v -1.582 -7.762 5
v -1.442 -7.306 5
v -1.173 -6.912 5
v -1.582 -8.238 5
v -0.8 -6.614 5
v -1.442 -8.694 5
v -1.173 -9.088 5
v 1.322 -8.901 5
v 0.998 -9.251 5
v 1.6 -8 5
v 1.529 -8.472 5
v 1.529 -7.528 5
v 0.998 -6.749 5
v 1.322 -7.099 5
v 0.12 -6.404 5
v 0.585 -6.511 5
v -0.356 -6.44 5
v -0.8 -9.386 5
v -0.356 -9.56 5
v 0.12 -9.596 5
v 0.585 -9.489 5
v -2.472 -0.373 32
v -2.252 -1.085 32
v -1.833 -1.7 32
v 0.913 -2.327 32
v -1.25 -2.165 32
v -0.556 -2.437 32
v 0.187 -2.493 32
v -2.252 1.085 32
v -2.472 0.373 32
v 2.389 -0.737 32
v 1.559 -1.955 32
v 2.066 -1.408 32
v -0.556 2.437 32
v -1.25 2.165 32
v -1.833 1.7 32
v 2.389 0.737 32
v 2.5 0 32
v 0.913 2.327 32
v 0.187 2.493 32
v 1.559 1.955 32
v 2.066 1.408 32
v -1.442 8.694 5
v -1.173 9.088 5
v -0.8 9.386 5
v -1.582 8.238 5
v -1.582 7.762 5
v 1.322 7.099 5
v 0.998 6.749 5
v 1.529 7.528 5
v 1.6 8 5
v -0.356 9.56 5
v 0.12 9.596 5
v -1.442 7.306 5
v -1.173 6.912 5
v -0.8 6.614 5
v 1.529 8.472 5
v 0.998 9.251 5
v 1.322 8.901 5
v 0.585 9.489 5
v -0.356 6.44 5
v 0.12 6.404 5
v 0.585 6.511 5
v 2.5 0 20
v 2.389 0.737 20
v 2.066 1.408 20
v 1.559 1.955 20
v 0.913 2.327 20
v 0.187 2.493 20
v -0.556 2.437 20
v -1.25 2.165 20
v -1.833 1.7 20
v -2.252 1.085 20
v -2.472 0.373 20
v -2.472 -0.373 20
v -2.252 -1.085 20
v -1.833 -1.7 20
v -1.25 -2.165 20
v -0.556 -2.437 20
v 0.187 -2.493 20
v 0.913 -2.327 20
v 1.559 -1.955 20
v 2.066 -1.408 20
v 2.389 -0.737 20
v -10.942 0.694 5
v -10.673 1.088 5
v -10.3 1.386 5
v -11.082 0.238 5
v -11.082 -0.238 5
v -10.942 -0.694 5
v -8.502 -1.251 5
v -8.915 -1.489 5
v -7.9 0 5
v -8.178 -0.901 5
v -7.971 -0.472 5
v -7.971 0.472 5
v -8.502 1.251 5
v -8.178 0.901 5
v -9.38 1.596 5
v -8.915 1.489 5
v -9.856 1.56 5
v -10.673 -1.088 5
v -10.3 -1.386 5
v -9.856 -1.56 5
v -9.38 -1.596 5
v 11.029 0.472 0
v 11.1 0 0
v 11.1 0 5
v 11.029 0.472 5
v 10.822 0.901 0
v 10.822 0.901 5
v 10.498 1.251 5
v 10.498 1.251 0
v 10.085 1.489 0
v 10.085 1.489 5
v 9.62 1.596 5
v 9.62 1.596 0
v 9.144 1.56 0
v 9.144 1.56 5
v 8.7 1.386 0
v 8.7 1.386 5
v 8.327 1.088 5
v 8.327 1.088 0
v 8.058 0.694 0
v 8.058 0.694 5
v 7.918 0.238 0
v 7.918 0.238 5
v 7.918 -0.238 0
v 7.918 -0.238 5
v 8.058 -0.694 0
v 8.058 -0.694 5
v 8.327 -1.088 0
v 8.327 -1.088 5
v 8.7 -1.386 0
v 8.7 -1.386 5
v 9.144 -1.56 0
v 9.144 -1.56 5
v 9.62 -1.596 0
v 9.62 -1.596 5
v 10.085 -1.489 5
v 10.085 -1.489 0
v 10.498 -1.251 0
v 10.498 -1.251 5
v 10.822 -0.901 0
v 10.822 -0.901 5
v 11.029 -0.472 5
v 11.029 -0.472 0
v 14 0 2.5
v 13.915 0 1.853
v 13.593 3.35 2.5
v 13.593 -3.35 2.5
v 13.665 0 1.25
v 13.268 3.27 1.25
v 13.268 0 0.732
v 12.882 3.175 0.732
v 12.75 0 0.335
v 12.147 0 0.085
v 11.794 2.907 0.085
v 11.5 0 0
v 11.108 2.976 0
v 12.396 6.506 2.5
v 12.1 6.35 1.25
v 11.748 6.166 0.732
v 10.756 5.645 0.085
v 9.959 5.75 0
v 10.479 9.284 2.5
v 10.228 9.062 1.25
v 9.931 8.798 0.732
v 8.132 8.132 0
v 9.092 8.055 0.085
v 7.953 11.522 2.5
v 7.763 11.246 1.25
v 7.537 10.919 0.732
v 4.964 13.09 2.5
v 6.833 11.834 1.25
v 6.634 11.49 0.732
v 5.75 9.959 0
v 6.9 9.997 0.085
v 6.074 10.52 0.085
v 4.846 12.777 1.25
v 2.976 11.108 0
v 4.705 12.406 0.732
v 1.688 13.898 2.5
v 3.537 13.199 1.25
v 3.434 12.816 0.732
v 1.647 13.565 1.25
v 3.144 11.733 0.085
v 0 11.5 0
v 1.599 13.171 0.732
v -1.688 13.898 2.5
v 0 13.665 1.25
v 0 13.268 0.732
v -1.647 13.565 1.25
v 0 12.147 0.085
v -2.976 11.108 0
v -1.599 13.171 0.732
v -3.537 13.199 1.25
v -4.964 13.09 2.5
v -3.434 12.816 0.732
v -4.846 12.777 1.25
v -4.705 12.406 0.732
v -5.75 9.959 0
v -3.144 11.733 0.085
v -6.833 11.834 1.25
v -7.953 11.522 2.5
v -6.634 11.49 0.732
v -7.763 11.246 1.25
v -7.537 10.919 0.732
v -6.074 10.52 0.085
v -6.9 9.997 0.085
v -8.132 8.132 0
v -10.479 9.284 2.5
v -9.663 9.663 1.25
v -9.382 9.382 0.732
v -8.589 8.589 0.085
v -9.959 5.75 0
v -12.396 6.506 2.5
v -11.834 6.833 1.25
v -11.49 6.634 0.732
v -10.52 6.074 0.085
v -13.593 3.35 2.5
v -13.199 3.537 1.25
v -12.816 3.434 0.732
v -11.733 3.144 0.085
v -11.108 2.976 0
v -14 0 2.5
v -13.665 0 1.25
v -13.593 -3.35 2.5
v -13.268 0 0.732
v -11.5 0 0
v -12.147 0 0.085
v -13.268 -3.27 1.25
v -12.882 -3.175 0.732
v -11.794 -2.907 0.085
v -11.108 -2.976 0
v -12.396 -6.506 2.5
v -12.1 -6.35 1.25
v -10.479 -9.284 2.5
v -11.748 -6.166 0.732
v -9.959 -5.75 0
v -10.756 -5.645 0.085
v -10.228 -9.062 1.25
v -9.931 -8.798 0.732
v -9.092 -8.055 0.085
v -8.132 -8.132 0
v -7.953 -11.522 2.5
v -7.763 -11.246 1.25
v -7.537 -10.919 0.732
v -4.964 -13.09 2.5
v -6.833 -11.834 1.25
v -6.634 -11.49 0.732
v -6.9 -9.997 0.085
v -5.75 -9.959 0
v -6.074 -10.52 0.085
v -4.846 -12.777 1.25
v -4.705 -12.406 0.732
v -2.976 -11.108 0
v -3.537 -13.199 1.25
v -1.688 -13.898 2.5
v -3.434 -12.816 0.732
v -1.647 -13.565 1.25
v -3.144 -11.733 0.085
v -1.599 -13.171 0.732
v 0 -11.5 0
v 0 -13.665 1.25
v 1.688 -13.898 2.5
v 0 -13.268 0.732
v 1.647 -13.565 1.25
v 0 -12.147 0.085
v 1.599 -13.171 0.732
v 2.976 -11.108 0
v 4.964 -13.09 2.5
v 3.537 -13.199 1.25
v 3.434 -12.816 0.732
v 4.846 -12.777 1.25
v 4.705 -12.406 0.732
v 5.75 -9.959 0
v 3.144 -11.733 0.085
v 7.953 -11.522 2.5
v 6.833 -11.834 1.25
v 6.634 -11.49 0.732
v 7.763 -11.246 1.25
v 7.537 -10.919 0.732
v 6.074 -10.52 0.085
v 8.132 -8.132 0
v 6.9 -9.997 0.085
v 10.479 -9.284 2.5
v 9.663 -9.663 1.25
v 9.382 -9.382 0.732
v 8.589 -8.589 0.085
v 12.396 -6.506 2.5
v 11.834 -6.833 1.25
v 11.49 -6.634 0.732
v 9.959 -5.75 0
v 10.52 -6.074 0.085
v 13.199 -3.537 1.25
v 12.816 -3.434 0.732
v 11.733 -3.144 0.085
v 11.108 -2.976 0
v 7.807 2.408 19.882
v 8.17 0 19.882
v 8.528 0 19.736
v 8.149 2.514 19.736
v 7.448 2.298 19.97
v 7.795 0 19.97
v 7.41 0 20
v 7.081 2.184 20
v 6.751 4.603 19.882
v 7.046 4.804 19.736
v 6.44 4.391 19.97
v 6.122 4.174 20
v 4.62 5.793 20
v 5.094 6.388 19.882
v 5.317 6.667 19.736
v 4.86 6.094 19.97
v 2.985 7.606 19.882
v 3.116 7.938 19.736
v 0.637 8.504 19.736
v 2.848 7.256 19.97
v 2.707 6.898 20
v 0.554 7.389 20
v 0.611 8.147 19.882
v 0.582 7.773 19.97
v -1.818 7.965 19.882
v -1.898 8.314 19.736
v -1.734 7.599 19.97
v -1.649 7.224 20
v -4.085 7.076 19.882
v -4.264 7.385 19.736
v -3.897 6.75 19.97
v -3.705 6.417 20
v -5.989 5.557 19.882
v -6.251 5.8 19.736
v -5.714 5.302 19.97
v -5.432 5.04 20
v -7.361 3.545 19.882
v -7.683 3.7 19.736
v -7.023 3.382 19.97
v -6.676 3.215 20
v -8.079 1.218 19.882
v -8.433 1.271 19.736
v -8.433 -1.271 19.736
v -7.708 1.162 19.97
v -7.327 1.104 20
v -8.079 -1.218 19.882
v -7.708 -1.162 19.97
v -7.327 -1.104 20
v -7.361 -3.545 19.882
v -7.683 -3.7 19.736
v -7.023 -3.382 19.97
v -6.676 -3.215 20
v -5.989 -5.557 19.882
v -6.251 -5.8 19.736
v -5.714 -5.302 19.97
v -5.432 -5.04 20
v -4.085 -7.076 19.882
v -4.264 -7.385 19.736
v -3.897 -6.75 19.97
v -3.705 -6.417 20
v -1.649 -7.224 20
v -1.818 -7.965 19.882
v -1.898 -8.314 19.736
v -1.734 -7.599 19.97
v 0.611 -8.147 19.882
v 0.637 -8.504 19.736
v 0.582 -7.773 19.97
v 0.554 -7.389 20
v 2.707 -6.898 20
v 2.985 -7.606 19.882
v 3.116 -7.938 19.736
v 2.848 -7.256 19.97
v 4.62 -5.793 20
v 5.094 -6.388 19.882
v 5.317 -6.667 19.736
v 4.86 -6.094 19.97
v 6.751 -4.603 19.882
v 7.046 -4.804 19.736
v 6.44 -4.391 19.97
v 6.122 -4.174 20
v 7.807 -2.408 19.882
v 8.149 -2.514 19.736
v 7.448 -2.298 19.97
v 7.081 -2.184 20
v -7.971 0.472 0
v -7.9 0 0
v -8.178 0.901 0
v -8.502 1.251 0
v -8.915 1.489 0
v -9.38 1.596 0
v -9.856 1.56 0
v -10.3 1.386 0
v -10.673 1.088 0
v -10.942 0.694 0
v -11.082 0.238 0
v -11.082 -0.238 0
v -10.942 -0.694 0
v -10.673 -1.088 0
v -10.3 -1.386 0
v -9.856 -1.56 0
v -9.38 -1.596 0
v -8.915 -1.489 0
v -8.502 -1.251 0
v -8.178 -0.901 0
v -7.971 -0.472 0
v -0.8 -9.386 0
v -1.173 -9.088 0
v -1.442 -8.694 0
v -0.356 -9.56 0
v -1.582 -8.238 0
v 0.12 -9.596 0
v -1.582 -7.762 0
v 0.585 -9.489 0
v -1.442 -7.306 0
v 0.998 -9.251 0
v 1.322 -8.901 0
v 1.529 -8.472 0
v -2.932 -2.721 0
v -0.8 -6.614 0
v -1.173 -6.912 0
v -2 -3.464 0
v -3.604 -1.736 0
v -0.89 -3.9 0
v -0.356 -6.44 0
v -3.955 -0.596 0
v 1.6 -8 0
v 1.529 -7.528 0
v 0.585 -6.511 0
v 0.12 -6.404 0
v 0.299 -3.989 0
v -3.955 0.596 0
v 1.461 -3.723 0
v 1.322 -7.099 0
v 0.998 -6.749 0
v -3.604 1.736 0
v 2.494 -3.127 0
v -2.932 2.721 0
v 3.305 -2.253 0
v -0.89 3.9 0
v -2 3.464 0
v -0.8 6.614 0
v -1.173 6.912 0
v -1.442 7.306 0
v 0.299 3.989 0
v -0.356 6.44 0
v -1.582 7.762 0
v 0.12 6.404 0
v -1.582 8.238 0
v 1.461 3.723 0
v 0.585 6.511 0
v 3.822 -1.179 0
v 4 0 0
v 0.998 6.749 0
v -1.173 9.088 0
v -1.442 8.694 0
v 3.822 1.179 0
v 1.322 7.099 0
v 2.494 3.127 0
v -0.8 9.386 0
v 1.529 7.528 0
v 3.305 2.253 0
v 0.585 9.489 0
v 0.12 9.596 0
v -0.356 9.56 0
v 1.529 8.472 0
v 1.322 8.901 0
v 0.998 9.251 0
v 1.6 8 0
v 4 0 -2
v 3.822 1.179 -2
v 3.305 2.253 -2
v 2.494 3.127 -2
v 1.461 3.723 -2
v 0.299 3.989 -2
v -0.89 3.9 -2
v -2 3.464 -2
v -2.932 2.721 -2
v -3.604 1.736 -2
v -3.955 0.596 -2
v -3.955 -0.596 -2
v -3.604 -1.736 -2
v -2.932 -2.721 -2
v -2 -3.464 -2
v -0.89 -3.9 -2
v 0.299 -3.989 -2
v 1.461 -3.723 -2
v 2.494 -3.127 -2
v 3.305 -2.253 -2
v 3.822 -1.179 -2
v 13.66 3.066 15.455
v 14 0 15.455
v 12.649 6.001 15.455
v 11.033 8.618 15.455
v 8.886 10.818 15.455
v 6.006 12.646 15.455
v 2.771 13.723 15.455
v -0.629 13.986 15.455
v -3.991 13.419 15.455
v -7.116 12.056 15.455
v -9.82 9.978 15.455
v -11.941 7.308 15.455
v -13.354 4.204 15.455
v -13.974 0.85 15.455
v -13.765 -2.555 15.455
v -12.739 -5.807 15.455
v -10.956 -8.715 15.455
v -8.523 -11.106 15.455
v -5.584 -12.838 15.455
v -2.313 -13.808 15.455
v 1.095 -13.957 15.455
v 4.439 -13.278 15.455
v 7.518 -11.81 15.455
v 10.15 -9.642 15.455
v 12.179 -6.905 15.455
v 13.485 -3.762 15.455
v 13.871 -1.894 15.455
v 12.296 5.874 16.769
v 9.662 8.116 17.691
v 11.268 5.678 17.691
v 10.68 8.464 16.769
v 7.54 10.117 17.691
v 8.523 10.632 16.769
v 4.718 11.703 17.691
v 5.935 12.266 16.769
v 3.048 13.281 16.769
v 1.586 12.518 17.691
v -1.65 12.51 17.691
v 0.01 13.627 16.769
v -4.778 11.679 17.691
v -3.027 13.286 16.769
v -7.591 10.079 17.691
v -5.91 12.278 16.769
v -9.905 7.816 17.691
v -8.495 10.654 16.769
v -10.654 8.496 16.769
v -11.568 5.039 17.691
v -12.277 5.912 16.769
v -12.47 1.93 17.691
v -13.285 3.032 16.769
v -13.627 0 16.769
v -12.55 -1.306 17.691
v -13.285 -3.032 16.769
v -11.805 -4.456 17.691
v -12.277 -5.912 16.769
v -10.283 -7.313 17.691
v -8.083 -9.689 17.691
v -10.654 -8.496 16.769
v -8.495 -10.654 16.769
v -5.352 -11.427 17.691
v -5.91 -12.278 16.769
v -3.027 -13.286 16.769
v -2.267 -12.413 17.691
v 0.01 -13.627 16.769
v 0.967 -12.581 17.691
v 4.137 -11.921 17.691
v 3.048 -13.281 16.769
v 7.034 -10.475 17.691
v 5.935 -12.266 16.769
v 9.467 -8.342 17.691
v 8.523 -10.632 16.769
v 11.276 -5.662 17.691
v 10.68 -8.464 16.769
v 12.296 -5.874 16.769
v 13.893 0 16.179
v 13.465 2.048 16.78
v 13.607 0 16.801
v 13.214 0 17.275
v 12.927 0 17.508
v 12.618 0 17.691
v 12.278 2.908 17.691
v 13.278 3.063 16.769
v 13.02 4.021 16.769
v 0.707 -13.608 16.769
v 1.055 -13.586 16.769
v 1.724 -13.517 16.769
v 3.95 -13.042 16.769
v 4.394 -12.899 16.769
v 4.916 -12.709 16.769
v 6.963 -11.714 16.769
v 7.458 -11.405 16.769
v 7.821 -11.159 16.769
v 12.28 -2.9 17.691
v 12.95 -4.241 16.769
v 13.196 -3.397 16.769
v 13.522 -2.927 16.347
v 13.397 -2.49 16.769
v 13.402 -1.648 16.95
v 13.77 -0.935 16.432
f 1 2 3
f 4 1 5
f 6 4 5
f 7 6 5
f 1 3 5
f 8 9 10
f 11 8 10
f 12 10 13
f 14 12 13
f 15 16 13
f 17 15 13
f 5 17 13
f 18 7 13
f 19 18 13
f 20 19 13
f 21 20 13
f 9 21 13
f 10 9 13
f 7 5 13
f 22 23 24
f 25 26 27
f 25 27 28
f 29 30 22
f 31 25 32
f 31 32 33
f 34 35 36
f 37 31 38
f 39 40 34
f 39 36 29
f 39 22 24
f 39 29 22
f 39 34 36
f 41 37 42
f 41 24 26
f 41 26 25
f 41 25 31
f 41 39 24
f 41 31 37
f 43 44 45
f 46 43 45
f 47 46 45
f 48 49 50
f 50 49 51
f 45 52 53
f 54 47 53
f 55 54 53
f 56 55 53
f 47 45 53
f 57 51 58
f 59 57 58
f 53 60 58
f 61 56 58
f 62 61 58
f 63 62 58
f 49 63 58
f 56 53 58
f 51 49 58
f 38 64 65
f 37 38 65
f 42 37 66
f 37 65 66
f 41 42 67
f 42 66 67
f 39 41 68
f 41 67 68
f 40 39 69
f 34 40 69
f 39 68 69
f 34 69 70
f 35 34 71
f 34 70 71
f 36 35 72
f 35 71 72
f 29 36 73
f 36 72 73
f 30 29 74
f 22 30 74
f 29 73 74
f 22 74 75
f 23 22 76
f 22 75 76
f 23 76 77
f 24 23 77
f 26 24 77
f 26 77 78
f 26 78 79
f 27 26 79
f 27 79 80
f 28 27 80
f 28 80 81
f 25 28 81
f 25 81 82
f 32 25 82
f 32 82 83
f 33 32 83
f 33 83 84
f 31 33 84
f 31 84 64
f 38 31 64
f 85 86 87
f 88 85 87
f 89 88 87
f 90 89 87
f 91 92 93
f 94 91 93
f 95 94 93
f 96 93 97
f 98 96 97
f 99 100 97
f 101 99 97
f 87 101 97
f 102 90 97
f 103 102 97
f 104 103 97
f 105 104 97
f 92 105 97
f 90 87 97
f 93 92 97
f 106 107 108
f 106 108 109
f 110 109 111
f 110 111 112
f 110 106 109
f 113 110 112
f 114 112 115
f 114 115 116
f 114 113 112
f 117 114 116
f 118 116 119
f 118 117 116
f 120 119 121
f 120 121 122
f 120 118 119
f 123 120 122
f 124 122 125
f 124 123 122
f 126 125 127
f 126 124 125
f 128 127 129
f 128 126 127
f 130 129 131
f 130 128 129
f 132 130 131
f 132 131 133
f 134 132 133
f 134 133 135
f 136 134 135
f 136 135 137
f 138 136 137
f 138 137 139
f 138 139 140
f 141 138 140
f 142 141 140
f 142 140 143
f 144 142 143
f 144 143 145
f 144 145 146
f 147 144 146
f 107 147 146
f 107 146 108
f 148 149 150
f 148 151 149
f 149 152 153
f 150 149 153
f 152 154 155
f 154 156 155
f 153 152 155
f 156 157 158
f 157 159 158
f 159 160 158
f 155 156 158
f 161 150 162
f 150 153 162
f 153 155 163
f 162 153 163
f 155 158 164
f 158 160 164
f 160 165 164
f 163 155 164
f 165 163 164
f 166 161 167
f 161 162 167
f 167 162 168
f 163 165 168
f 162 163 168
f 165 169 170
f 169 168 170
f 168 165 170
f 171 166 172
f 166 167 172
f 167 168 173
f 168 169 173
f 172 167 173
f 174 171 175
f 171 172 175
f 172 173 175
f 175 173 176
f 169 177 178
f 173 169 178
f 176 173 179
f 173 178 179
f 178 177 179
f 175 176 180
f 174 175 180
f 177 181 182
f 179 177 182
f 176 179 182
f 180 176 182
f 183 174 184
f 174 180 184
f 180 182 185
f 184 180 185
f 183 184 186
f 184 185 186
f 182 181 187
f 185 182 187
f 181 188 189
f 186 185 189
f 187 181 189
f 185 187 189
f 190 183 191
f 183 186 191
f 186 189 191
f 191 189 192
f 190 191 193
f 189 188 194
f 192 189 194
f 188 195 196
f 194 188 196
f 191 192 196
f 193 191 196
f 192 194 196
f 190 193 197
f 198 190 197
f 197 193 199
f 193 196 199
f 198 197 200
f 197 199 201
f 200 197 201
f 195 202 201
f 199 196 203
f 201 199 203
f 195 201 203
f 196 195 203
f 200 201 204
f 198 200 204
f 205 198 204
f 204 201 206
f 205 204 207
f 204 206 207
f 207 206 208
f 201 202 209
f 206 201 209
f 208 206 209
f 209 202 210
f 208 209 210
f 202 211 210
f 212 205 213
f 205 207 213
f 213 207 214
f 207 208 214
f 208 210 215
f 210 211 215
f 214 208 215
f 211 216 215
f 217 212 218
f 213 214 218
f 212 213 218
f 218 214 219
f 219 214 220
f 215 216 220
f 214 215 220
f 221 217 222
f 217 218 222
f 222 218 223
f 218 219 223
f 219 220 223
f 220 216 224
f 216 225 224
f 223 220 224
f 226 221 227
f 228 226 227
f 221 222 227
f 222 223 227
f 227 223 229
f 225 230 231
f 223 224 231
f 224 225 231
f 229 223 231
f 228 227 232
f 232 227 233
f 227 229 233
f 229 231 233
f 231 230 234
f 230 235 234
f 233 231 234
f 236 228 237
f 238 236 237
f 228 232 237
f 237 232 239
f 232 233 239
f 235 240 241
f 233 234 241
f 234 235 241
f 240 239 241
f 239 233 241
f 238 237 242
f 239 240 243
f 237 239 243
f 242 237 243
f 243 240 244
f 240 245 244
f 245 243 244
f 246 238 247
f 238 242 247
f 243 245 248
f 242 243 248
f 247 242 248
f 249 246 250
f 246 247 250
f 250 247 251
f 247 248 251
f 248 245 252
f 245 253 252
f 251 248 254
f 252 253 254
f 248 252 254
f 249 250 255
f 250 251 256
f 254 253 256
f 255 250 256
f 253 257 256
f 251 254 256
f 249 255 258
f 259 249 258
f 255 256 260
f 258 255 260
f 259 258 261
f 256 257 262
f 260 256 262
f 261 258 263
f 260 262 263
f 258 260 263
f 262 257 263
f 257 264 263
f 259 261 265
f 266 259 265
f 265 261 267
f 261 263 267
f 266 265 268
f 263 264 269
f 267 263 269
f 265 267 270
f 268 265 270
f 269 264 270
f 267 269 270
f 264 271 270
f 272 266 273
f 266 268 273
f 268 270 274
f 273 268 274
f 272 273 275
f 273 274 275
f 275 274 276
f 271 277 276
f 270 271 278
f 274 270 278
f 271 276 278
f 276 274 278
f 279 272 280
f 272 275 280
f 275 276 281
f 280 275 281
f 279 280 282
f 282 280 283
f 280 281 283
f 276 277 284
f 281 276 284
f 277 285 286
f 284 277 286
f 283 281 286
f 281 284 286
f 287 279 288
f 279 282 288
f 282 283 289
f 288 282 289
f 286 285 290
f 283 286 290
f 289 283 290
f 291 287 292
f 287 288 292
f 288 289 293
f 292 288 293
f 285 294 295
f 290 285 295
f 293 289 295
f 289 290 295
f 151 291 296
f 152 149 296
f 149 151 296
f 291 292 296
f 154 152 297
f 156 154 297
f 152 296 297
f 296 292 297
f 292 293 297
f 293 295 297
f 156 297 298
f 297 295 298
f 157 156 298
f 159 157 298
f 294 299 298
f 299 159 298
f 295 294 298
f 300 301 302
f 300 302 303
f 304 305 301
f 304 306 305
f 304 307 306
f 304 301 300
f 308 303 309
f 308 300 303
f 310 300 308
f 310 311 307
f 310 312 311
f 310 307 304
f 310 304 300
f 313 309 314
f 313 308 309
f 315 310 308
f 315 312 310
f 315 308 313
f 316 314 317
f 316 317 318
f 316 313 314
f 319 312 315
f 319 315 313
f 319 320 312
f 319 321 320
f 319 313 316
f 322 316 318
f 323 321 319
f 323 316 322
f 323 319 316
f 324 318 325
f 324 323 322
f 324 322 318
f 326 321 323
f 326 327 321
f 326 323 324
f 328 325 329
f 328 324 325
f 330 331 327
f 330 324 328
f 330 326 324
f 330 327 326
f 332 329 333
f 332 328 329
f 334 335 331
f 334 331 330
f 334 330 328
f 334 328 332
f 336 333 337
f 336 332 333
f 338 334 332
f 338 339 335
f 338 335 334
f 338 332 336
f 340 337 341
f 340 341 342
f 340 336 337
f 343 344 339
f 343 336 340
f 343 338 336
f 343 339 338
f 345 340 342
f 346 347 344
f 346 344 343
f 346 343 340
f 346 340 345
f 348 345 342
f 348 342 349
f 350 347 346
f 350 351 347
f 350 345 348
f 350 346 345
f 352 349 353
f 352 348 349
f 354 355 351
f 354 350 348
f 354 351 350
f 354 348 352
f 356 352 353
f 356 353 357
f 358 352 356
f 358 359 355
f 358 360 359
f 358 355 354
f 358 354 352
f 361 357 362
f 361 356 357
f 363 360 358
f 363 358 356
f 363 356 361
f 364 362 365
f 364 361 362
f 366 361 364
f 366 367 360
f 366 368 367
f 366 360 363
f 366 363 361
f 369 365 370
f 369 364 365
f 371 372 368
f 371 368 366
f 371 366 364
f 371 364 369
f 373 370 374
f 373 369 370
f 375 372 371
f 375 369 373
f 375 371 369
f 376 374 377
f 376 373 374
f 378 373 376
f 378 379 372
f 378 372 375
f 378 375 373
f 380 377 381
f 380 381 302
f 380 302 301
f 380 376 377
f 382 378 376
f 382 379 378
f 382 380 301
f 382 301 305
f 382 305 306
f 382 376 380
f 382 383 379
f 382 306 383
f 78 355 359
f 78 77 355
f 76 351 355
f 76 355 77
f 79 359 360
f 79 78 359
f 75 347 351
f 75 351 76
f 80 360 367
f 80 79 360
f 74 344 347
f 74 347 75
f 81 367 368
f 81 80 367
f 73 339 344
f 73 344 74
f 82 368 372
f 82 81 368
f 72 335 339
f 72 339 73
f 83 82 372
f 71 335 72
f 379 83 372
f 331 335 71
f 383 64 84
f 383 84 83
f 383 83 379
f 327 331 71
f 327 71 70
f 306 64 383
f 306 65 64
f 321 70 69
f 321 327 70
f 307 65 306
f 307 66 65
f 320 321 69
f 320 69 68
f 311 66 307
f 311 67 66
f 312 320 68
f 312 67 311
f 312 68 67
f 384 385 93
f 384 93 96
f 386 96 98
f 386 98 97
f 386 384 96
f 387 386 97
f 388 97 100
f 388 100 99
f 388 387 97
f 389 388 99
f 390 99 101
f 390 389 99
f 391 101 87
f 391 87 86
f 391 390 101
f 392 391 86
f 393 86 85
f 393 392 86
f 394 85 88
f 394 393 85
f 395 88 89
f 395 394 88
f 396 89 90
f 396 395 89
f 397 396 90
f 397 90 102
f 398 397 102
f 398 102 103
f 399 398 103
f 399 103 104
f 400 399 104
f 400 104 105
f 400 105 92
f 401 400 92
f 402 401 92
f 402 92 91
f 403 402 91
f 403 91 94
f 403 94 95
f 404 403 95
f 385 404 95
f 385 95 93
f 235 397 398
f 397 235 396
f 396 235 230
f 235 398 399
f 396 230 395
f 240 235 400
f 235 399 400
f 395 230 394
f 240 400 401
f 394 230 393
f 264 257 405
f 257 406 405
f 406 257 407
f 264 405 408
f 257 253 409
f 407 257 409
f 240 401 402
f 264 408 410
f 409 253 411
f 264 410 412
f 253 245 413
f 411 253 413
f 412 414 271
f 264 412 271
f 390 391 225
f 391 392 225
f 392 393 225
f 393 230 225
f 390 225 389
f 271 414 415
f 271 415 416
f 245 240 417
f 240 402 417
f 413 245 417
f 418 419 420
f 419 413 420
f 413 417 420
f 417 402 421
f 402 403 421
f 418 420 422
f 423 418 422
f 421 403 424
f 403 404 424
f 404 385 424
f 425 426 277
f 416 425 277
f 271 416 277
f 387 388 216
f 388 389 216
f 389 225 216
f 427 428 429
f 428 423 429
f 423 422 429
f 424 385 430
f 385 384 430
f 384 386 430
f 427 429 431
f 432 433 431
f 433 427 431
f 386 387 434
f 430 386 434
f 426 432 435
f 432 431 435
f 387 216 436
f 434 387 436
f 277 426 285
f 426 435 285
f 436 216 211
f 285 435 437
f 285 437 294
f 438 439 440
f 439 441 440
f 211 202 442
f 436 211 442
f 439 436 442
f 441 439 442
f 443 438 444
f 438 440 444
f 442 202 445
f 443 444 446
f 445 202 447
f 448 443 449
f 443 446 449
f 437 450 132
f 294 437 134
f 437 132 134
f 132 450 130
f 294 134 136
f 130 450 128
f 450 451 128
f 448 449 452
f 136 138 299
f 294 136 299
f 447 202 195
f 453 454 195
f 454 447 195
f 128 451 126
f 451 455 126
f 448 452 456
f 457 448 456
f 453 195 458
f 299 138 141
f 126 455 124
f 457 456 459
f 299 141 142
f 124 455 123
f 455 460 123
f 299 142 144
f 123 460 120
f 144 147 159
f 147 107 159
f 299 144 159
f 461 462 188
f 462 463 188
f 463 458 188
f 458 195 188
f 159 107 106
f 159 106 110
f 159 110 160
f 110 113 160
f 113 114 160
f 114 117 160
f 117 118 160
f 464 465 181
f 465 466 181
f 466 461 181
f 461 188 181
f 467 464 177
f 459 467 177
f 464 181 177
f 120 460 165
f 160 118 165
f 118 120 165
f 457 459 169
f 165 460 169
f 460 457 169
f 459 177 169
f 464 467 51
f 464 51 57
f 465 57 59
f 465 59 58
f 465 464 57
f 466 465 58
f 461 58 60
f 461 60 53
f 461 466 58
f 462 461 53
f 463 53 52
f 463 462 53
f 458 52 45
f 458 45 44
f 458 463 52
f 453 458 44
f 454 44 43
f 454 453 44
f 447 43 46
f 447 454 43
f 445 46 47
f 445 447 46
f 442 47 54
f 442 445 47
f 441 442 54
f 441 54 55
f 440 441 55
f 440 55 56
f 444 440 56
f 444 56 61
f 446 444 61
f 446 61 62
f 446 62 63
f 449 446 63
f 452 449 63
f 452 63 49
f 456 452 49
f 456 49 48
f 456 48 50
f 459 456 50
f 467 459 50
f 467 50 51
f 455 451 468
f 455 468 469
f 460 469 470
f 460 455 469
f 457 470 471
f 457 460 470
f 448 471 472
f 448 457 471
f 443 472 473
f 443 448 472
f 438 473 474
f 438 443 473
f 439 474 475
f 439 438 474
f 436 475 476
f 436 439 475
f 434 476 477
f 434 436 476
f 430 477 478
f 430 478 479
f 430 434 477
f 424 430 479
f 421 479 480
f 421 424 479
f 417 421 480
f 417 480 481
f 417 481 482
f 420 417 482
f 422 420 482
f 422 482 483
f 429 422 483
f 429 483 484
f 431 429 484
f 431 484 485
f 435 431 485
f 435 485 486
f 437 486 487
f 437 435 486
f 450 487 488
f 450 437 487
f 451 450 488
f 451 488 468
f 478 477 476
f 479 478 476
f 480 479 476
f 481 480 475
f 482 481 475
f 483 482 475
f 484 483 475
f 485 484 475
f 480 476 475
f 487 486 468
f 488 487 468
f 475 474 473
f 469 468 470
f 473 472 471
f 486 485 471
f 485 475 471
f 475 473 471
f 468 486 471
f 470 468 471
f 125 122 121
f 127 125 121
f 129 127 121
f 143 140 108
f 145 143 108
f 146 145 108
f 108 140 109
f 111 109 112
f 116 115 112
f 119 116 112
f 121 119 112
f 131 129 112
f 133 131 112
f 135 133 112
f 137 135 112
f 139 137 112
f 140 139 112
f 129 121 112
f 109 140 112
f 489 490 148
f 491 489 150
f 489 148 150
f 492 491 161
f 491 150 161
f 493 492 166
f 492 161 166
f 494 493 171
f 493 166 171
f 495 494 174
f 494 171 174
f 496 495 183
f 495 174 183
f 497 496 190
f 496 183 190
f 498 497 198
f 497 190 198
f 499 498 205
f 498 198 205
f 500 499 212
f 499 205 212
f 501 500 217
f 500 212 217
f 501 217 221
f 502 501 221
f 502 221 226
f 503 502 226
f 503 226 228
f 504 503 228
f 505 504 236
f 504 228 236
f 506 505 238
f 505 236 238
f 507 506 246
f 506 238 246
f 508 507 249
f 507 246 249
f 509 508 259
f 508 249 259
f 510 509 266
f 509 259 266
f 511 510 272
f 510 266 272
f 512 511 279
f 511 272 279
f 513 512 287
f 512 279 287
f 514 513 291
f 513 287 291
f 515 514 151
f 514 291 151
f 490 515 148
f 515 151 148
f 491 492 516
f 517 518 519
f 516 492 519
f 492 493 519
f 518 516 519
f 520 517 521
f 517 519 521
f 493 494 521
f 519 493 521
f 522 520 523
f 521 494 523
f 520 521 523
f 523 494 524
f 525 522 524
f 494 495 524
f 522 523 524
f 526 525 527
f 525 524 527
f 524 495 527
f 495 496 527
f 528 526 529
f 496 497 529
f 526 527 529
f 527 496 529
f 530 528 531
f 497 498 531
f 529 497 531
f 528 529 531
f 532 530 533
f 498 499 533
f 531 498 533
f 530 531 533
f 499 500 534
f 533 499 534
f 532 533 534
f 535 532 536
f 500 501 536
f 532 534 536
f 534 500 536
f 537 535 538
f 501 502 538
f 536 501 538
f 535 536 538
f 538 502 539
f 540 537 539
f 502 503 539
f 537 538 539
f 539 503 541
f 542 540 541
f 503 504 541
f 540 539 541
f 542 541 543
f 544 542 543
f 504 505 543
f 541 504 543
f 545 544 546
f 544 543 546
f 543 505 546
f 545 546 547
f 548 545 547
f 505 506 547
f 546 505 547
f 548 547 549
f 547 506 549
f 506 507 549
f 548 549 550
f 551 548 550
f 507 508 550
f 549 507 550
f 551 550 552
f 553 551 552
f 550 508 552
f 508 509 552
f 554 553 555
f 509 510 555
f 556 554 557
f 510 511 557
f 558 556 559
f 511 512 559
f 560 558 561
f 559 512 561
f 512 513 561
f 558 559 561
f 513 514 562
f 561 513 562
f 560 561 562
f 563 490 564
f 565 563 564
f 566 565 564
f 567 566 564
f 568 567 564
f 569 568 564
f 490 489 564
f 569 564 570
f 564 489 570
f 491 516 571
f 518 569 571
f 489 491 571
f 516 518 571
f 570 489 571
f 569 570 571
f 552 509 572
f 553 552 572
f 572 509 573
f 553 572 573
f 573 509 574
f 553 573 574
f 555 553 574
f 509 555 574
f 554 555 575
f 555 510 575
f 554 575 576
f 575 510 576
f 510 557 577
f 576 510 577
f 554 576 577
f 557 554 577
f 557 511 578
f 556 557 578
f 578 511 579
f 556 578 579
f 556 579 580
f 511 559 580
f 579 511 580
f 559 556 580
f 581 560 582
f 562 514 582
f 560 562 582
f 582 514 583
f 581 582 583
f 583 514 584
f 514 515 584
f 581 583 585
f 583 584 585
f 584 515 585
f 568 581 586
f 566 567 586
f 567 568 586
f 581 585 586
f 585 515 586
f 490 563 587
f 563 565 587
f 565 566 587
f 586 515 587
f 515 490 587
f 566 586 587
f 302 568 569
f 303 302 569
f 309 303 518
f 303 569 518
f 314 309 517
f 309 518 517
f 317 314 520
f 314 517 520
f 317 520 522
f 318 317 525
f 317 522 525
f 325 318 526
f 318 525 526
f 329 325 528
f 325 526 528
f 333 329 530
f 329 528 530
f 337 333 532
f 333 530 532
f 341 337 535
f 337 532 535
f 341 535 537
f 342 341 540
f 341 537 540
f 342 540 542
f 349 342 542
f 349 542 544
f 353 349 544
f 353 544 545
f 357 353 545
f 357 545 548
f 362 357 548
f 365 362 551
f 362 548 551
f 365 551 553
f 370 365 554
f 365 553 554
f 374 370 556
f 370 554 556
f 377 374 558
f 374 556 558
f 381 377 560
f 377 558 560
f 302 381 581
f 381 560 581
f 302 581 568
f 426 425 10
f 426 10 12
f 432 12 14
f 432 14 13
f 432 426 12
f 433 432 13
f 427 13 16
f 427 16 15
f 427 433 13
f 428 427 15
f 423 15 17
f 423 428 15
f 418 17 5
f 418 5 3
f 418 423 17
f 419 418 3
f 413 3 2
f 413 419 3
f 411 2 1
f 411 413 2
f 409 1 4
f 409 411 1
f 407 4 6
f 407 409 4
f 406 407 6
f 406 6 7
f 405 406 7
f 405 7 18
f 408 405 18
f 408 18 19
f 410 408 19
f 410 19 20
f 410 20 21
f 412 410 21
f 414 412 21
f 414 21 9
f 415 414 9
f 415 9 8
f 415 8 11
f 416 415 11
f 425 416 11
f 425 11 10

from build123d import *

# Parameters (mm, degrees)
F0_R     = 14
F0_R_2   = 1.6
F0_R_3   = 4
F0_R_4   = 2.5
F1_DEPTH = 20
F2_DEPTH = 32
F3_DEPTH = 2
F4_START = 5
F4_DEPTH = 15
F5_SIZE2 = 3
F5_SIZE  = 6
F6_R     = 2.5


with BuildPart() as f1:
    # F0 (on Top) → F1 (new body)
    with BuildSketch(Plane.XY):
        Circle(F0_R)
        with Locations((0, -8)):
            Circle(F0_R_2, mode=Mode.SUBTRACT)
        with Locations((-9.5, 0)):
            Circle(F0_R_2, mode=Mode.SUBTRACT)
        Circle(F0_R_3, mode=Mode.SUBTRACT)
        with Locations((9.5, 0)):
            Circle(F0_R_2, mode=Mode.SUBTRACT)
        with Locations((0, 8)):
            Circle(F0_R_2, mode=Mode.SUBTRACT)
        Circle(F0_R_3)
        Circle(F0_R_4, mode=Mode.SUBTRACT)
        Circle(F0_R_4)
    extrude(amount=F1_DEPTH)

    # F0 (on Top) → F2 (join)
    with BuildSketch(Plane.XY):
        Circle(F0_R_4)
    extrude(amount=F2_DEPTH)

    # F0 (on Top) → F3 (join)
    with BuildSketch(Plane.XY):
        Circle(F0_R_3)
        Circle(F0_R_4, mode=Mode.SUBTRACT)
        Circle(F0_R_4)
    extrude(amount=-F3_DEPTH)

    # F0 (on Top) → F4 (join)
    with BuildSketch(Plane.XY.offset(F4_START)):
        with Locations((0, 8)):
            Circle(F0_R_2)
        with Locations((9.5, 0)):
            Circle(F0_R_2)
        with Locations((0, -8)):
            Circle(F0_R_2)
        with Locations((-9.5, 0)):
            Circle(F0_R_2)
    extrude(amount=F4_DEPTH)

    # F5
    f5_edges = [f1.edges().sort_by_distance(p)[0] for p in [
        (-14, 0, 20),
    ]]
    f5_side = f1.faces().sort_by_distance((-13.60402, 0, 20))[0]
    chamfer(f5_edges, length=F5_SIZE, length2=F5_SIZE2, reference=f5_side)

    # F6
    f6_edges = [f1.edges().sort_by_distance(p)[0] for p in [
        (11, 0, 18.5),
        (-8, 0, 20),
        (-14, 0, 17),
        (14, 0, 8.5),
        (-14, 0, 0),
    ]]
    fillet(f6_edges, radius=F6_R)


solid = f1.part
